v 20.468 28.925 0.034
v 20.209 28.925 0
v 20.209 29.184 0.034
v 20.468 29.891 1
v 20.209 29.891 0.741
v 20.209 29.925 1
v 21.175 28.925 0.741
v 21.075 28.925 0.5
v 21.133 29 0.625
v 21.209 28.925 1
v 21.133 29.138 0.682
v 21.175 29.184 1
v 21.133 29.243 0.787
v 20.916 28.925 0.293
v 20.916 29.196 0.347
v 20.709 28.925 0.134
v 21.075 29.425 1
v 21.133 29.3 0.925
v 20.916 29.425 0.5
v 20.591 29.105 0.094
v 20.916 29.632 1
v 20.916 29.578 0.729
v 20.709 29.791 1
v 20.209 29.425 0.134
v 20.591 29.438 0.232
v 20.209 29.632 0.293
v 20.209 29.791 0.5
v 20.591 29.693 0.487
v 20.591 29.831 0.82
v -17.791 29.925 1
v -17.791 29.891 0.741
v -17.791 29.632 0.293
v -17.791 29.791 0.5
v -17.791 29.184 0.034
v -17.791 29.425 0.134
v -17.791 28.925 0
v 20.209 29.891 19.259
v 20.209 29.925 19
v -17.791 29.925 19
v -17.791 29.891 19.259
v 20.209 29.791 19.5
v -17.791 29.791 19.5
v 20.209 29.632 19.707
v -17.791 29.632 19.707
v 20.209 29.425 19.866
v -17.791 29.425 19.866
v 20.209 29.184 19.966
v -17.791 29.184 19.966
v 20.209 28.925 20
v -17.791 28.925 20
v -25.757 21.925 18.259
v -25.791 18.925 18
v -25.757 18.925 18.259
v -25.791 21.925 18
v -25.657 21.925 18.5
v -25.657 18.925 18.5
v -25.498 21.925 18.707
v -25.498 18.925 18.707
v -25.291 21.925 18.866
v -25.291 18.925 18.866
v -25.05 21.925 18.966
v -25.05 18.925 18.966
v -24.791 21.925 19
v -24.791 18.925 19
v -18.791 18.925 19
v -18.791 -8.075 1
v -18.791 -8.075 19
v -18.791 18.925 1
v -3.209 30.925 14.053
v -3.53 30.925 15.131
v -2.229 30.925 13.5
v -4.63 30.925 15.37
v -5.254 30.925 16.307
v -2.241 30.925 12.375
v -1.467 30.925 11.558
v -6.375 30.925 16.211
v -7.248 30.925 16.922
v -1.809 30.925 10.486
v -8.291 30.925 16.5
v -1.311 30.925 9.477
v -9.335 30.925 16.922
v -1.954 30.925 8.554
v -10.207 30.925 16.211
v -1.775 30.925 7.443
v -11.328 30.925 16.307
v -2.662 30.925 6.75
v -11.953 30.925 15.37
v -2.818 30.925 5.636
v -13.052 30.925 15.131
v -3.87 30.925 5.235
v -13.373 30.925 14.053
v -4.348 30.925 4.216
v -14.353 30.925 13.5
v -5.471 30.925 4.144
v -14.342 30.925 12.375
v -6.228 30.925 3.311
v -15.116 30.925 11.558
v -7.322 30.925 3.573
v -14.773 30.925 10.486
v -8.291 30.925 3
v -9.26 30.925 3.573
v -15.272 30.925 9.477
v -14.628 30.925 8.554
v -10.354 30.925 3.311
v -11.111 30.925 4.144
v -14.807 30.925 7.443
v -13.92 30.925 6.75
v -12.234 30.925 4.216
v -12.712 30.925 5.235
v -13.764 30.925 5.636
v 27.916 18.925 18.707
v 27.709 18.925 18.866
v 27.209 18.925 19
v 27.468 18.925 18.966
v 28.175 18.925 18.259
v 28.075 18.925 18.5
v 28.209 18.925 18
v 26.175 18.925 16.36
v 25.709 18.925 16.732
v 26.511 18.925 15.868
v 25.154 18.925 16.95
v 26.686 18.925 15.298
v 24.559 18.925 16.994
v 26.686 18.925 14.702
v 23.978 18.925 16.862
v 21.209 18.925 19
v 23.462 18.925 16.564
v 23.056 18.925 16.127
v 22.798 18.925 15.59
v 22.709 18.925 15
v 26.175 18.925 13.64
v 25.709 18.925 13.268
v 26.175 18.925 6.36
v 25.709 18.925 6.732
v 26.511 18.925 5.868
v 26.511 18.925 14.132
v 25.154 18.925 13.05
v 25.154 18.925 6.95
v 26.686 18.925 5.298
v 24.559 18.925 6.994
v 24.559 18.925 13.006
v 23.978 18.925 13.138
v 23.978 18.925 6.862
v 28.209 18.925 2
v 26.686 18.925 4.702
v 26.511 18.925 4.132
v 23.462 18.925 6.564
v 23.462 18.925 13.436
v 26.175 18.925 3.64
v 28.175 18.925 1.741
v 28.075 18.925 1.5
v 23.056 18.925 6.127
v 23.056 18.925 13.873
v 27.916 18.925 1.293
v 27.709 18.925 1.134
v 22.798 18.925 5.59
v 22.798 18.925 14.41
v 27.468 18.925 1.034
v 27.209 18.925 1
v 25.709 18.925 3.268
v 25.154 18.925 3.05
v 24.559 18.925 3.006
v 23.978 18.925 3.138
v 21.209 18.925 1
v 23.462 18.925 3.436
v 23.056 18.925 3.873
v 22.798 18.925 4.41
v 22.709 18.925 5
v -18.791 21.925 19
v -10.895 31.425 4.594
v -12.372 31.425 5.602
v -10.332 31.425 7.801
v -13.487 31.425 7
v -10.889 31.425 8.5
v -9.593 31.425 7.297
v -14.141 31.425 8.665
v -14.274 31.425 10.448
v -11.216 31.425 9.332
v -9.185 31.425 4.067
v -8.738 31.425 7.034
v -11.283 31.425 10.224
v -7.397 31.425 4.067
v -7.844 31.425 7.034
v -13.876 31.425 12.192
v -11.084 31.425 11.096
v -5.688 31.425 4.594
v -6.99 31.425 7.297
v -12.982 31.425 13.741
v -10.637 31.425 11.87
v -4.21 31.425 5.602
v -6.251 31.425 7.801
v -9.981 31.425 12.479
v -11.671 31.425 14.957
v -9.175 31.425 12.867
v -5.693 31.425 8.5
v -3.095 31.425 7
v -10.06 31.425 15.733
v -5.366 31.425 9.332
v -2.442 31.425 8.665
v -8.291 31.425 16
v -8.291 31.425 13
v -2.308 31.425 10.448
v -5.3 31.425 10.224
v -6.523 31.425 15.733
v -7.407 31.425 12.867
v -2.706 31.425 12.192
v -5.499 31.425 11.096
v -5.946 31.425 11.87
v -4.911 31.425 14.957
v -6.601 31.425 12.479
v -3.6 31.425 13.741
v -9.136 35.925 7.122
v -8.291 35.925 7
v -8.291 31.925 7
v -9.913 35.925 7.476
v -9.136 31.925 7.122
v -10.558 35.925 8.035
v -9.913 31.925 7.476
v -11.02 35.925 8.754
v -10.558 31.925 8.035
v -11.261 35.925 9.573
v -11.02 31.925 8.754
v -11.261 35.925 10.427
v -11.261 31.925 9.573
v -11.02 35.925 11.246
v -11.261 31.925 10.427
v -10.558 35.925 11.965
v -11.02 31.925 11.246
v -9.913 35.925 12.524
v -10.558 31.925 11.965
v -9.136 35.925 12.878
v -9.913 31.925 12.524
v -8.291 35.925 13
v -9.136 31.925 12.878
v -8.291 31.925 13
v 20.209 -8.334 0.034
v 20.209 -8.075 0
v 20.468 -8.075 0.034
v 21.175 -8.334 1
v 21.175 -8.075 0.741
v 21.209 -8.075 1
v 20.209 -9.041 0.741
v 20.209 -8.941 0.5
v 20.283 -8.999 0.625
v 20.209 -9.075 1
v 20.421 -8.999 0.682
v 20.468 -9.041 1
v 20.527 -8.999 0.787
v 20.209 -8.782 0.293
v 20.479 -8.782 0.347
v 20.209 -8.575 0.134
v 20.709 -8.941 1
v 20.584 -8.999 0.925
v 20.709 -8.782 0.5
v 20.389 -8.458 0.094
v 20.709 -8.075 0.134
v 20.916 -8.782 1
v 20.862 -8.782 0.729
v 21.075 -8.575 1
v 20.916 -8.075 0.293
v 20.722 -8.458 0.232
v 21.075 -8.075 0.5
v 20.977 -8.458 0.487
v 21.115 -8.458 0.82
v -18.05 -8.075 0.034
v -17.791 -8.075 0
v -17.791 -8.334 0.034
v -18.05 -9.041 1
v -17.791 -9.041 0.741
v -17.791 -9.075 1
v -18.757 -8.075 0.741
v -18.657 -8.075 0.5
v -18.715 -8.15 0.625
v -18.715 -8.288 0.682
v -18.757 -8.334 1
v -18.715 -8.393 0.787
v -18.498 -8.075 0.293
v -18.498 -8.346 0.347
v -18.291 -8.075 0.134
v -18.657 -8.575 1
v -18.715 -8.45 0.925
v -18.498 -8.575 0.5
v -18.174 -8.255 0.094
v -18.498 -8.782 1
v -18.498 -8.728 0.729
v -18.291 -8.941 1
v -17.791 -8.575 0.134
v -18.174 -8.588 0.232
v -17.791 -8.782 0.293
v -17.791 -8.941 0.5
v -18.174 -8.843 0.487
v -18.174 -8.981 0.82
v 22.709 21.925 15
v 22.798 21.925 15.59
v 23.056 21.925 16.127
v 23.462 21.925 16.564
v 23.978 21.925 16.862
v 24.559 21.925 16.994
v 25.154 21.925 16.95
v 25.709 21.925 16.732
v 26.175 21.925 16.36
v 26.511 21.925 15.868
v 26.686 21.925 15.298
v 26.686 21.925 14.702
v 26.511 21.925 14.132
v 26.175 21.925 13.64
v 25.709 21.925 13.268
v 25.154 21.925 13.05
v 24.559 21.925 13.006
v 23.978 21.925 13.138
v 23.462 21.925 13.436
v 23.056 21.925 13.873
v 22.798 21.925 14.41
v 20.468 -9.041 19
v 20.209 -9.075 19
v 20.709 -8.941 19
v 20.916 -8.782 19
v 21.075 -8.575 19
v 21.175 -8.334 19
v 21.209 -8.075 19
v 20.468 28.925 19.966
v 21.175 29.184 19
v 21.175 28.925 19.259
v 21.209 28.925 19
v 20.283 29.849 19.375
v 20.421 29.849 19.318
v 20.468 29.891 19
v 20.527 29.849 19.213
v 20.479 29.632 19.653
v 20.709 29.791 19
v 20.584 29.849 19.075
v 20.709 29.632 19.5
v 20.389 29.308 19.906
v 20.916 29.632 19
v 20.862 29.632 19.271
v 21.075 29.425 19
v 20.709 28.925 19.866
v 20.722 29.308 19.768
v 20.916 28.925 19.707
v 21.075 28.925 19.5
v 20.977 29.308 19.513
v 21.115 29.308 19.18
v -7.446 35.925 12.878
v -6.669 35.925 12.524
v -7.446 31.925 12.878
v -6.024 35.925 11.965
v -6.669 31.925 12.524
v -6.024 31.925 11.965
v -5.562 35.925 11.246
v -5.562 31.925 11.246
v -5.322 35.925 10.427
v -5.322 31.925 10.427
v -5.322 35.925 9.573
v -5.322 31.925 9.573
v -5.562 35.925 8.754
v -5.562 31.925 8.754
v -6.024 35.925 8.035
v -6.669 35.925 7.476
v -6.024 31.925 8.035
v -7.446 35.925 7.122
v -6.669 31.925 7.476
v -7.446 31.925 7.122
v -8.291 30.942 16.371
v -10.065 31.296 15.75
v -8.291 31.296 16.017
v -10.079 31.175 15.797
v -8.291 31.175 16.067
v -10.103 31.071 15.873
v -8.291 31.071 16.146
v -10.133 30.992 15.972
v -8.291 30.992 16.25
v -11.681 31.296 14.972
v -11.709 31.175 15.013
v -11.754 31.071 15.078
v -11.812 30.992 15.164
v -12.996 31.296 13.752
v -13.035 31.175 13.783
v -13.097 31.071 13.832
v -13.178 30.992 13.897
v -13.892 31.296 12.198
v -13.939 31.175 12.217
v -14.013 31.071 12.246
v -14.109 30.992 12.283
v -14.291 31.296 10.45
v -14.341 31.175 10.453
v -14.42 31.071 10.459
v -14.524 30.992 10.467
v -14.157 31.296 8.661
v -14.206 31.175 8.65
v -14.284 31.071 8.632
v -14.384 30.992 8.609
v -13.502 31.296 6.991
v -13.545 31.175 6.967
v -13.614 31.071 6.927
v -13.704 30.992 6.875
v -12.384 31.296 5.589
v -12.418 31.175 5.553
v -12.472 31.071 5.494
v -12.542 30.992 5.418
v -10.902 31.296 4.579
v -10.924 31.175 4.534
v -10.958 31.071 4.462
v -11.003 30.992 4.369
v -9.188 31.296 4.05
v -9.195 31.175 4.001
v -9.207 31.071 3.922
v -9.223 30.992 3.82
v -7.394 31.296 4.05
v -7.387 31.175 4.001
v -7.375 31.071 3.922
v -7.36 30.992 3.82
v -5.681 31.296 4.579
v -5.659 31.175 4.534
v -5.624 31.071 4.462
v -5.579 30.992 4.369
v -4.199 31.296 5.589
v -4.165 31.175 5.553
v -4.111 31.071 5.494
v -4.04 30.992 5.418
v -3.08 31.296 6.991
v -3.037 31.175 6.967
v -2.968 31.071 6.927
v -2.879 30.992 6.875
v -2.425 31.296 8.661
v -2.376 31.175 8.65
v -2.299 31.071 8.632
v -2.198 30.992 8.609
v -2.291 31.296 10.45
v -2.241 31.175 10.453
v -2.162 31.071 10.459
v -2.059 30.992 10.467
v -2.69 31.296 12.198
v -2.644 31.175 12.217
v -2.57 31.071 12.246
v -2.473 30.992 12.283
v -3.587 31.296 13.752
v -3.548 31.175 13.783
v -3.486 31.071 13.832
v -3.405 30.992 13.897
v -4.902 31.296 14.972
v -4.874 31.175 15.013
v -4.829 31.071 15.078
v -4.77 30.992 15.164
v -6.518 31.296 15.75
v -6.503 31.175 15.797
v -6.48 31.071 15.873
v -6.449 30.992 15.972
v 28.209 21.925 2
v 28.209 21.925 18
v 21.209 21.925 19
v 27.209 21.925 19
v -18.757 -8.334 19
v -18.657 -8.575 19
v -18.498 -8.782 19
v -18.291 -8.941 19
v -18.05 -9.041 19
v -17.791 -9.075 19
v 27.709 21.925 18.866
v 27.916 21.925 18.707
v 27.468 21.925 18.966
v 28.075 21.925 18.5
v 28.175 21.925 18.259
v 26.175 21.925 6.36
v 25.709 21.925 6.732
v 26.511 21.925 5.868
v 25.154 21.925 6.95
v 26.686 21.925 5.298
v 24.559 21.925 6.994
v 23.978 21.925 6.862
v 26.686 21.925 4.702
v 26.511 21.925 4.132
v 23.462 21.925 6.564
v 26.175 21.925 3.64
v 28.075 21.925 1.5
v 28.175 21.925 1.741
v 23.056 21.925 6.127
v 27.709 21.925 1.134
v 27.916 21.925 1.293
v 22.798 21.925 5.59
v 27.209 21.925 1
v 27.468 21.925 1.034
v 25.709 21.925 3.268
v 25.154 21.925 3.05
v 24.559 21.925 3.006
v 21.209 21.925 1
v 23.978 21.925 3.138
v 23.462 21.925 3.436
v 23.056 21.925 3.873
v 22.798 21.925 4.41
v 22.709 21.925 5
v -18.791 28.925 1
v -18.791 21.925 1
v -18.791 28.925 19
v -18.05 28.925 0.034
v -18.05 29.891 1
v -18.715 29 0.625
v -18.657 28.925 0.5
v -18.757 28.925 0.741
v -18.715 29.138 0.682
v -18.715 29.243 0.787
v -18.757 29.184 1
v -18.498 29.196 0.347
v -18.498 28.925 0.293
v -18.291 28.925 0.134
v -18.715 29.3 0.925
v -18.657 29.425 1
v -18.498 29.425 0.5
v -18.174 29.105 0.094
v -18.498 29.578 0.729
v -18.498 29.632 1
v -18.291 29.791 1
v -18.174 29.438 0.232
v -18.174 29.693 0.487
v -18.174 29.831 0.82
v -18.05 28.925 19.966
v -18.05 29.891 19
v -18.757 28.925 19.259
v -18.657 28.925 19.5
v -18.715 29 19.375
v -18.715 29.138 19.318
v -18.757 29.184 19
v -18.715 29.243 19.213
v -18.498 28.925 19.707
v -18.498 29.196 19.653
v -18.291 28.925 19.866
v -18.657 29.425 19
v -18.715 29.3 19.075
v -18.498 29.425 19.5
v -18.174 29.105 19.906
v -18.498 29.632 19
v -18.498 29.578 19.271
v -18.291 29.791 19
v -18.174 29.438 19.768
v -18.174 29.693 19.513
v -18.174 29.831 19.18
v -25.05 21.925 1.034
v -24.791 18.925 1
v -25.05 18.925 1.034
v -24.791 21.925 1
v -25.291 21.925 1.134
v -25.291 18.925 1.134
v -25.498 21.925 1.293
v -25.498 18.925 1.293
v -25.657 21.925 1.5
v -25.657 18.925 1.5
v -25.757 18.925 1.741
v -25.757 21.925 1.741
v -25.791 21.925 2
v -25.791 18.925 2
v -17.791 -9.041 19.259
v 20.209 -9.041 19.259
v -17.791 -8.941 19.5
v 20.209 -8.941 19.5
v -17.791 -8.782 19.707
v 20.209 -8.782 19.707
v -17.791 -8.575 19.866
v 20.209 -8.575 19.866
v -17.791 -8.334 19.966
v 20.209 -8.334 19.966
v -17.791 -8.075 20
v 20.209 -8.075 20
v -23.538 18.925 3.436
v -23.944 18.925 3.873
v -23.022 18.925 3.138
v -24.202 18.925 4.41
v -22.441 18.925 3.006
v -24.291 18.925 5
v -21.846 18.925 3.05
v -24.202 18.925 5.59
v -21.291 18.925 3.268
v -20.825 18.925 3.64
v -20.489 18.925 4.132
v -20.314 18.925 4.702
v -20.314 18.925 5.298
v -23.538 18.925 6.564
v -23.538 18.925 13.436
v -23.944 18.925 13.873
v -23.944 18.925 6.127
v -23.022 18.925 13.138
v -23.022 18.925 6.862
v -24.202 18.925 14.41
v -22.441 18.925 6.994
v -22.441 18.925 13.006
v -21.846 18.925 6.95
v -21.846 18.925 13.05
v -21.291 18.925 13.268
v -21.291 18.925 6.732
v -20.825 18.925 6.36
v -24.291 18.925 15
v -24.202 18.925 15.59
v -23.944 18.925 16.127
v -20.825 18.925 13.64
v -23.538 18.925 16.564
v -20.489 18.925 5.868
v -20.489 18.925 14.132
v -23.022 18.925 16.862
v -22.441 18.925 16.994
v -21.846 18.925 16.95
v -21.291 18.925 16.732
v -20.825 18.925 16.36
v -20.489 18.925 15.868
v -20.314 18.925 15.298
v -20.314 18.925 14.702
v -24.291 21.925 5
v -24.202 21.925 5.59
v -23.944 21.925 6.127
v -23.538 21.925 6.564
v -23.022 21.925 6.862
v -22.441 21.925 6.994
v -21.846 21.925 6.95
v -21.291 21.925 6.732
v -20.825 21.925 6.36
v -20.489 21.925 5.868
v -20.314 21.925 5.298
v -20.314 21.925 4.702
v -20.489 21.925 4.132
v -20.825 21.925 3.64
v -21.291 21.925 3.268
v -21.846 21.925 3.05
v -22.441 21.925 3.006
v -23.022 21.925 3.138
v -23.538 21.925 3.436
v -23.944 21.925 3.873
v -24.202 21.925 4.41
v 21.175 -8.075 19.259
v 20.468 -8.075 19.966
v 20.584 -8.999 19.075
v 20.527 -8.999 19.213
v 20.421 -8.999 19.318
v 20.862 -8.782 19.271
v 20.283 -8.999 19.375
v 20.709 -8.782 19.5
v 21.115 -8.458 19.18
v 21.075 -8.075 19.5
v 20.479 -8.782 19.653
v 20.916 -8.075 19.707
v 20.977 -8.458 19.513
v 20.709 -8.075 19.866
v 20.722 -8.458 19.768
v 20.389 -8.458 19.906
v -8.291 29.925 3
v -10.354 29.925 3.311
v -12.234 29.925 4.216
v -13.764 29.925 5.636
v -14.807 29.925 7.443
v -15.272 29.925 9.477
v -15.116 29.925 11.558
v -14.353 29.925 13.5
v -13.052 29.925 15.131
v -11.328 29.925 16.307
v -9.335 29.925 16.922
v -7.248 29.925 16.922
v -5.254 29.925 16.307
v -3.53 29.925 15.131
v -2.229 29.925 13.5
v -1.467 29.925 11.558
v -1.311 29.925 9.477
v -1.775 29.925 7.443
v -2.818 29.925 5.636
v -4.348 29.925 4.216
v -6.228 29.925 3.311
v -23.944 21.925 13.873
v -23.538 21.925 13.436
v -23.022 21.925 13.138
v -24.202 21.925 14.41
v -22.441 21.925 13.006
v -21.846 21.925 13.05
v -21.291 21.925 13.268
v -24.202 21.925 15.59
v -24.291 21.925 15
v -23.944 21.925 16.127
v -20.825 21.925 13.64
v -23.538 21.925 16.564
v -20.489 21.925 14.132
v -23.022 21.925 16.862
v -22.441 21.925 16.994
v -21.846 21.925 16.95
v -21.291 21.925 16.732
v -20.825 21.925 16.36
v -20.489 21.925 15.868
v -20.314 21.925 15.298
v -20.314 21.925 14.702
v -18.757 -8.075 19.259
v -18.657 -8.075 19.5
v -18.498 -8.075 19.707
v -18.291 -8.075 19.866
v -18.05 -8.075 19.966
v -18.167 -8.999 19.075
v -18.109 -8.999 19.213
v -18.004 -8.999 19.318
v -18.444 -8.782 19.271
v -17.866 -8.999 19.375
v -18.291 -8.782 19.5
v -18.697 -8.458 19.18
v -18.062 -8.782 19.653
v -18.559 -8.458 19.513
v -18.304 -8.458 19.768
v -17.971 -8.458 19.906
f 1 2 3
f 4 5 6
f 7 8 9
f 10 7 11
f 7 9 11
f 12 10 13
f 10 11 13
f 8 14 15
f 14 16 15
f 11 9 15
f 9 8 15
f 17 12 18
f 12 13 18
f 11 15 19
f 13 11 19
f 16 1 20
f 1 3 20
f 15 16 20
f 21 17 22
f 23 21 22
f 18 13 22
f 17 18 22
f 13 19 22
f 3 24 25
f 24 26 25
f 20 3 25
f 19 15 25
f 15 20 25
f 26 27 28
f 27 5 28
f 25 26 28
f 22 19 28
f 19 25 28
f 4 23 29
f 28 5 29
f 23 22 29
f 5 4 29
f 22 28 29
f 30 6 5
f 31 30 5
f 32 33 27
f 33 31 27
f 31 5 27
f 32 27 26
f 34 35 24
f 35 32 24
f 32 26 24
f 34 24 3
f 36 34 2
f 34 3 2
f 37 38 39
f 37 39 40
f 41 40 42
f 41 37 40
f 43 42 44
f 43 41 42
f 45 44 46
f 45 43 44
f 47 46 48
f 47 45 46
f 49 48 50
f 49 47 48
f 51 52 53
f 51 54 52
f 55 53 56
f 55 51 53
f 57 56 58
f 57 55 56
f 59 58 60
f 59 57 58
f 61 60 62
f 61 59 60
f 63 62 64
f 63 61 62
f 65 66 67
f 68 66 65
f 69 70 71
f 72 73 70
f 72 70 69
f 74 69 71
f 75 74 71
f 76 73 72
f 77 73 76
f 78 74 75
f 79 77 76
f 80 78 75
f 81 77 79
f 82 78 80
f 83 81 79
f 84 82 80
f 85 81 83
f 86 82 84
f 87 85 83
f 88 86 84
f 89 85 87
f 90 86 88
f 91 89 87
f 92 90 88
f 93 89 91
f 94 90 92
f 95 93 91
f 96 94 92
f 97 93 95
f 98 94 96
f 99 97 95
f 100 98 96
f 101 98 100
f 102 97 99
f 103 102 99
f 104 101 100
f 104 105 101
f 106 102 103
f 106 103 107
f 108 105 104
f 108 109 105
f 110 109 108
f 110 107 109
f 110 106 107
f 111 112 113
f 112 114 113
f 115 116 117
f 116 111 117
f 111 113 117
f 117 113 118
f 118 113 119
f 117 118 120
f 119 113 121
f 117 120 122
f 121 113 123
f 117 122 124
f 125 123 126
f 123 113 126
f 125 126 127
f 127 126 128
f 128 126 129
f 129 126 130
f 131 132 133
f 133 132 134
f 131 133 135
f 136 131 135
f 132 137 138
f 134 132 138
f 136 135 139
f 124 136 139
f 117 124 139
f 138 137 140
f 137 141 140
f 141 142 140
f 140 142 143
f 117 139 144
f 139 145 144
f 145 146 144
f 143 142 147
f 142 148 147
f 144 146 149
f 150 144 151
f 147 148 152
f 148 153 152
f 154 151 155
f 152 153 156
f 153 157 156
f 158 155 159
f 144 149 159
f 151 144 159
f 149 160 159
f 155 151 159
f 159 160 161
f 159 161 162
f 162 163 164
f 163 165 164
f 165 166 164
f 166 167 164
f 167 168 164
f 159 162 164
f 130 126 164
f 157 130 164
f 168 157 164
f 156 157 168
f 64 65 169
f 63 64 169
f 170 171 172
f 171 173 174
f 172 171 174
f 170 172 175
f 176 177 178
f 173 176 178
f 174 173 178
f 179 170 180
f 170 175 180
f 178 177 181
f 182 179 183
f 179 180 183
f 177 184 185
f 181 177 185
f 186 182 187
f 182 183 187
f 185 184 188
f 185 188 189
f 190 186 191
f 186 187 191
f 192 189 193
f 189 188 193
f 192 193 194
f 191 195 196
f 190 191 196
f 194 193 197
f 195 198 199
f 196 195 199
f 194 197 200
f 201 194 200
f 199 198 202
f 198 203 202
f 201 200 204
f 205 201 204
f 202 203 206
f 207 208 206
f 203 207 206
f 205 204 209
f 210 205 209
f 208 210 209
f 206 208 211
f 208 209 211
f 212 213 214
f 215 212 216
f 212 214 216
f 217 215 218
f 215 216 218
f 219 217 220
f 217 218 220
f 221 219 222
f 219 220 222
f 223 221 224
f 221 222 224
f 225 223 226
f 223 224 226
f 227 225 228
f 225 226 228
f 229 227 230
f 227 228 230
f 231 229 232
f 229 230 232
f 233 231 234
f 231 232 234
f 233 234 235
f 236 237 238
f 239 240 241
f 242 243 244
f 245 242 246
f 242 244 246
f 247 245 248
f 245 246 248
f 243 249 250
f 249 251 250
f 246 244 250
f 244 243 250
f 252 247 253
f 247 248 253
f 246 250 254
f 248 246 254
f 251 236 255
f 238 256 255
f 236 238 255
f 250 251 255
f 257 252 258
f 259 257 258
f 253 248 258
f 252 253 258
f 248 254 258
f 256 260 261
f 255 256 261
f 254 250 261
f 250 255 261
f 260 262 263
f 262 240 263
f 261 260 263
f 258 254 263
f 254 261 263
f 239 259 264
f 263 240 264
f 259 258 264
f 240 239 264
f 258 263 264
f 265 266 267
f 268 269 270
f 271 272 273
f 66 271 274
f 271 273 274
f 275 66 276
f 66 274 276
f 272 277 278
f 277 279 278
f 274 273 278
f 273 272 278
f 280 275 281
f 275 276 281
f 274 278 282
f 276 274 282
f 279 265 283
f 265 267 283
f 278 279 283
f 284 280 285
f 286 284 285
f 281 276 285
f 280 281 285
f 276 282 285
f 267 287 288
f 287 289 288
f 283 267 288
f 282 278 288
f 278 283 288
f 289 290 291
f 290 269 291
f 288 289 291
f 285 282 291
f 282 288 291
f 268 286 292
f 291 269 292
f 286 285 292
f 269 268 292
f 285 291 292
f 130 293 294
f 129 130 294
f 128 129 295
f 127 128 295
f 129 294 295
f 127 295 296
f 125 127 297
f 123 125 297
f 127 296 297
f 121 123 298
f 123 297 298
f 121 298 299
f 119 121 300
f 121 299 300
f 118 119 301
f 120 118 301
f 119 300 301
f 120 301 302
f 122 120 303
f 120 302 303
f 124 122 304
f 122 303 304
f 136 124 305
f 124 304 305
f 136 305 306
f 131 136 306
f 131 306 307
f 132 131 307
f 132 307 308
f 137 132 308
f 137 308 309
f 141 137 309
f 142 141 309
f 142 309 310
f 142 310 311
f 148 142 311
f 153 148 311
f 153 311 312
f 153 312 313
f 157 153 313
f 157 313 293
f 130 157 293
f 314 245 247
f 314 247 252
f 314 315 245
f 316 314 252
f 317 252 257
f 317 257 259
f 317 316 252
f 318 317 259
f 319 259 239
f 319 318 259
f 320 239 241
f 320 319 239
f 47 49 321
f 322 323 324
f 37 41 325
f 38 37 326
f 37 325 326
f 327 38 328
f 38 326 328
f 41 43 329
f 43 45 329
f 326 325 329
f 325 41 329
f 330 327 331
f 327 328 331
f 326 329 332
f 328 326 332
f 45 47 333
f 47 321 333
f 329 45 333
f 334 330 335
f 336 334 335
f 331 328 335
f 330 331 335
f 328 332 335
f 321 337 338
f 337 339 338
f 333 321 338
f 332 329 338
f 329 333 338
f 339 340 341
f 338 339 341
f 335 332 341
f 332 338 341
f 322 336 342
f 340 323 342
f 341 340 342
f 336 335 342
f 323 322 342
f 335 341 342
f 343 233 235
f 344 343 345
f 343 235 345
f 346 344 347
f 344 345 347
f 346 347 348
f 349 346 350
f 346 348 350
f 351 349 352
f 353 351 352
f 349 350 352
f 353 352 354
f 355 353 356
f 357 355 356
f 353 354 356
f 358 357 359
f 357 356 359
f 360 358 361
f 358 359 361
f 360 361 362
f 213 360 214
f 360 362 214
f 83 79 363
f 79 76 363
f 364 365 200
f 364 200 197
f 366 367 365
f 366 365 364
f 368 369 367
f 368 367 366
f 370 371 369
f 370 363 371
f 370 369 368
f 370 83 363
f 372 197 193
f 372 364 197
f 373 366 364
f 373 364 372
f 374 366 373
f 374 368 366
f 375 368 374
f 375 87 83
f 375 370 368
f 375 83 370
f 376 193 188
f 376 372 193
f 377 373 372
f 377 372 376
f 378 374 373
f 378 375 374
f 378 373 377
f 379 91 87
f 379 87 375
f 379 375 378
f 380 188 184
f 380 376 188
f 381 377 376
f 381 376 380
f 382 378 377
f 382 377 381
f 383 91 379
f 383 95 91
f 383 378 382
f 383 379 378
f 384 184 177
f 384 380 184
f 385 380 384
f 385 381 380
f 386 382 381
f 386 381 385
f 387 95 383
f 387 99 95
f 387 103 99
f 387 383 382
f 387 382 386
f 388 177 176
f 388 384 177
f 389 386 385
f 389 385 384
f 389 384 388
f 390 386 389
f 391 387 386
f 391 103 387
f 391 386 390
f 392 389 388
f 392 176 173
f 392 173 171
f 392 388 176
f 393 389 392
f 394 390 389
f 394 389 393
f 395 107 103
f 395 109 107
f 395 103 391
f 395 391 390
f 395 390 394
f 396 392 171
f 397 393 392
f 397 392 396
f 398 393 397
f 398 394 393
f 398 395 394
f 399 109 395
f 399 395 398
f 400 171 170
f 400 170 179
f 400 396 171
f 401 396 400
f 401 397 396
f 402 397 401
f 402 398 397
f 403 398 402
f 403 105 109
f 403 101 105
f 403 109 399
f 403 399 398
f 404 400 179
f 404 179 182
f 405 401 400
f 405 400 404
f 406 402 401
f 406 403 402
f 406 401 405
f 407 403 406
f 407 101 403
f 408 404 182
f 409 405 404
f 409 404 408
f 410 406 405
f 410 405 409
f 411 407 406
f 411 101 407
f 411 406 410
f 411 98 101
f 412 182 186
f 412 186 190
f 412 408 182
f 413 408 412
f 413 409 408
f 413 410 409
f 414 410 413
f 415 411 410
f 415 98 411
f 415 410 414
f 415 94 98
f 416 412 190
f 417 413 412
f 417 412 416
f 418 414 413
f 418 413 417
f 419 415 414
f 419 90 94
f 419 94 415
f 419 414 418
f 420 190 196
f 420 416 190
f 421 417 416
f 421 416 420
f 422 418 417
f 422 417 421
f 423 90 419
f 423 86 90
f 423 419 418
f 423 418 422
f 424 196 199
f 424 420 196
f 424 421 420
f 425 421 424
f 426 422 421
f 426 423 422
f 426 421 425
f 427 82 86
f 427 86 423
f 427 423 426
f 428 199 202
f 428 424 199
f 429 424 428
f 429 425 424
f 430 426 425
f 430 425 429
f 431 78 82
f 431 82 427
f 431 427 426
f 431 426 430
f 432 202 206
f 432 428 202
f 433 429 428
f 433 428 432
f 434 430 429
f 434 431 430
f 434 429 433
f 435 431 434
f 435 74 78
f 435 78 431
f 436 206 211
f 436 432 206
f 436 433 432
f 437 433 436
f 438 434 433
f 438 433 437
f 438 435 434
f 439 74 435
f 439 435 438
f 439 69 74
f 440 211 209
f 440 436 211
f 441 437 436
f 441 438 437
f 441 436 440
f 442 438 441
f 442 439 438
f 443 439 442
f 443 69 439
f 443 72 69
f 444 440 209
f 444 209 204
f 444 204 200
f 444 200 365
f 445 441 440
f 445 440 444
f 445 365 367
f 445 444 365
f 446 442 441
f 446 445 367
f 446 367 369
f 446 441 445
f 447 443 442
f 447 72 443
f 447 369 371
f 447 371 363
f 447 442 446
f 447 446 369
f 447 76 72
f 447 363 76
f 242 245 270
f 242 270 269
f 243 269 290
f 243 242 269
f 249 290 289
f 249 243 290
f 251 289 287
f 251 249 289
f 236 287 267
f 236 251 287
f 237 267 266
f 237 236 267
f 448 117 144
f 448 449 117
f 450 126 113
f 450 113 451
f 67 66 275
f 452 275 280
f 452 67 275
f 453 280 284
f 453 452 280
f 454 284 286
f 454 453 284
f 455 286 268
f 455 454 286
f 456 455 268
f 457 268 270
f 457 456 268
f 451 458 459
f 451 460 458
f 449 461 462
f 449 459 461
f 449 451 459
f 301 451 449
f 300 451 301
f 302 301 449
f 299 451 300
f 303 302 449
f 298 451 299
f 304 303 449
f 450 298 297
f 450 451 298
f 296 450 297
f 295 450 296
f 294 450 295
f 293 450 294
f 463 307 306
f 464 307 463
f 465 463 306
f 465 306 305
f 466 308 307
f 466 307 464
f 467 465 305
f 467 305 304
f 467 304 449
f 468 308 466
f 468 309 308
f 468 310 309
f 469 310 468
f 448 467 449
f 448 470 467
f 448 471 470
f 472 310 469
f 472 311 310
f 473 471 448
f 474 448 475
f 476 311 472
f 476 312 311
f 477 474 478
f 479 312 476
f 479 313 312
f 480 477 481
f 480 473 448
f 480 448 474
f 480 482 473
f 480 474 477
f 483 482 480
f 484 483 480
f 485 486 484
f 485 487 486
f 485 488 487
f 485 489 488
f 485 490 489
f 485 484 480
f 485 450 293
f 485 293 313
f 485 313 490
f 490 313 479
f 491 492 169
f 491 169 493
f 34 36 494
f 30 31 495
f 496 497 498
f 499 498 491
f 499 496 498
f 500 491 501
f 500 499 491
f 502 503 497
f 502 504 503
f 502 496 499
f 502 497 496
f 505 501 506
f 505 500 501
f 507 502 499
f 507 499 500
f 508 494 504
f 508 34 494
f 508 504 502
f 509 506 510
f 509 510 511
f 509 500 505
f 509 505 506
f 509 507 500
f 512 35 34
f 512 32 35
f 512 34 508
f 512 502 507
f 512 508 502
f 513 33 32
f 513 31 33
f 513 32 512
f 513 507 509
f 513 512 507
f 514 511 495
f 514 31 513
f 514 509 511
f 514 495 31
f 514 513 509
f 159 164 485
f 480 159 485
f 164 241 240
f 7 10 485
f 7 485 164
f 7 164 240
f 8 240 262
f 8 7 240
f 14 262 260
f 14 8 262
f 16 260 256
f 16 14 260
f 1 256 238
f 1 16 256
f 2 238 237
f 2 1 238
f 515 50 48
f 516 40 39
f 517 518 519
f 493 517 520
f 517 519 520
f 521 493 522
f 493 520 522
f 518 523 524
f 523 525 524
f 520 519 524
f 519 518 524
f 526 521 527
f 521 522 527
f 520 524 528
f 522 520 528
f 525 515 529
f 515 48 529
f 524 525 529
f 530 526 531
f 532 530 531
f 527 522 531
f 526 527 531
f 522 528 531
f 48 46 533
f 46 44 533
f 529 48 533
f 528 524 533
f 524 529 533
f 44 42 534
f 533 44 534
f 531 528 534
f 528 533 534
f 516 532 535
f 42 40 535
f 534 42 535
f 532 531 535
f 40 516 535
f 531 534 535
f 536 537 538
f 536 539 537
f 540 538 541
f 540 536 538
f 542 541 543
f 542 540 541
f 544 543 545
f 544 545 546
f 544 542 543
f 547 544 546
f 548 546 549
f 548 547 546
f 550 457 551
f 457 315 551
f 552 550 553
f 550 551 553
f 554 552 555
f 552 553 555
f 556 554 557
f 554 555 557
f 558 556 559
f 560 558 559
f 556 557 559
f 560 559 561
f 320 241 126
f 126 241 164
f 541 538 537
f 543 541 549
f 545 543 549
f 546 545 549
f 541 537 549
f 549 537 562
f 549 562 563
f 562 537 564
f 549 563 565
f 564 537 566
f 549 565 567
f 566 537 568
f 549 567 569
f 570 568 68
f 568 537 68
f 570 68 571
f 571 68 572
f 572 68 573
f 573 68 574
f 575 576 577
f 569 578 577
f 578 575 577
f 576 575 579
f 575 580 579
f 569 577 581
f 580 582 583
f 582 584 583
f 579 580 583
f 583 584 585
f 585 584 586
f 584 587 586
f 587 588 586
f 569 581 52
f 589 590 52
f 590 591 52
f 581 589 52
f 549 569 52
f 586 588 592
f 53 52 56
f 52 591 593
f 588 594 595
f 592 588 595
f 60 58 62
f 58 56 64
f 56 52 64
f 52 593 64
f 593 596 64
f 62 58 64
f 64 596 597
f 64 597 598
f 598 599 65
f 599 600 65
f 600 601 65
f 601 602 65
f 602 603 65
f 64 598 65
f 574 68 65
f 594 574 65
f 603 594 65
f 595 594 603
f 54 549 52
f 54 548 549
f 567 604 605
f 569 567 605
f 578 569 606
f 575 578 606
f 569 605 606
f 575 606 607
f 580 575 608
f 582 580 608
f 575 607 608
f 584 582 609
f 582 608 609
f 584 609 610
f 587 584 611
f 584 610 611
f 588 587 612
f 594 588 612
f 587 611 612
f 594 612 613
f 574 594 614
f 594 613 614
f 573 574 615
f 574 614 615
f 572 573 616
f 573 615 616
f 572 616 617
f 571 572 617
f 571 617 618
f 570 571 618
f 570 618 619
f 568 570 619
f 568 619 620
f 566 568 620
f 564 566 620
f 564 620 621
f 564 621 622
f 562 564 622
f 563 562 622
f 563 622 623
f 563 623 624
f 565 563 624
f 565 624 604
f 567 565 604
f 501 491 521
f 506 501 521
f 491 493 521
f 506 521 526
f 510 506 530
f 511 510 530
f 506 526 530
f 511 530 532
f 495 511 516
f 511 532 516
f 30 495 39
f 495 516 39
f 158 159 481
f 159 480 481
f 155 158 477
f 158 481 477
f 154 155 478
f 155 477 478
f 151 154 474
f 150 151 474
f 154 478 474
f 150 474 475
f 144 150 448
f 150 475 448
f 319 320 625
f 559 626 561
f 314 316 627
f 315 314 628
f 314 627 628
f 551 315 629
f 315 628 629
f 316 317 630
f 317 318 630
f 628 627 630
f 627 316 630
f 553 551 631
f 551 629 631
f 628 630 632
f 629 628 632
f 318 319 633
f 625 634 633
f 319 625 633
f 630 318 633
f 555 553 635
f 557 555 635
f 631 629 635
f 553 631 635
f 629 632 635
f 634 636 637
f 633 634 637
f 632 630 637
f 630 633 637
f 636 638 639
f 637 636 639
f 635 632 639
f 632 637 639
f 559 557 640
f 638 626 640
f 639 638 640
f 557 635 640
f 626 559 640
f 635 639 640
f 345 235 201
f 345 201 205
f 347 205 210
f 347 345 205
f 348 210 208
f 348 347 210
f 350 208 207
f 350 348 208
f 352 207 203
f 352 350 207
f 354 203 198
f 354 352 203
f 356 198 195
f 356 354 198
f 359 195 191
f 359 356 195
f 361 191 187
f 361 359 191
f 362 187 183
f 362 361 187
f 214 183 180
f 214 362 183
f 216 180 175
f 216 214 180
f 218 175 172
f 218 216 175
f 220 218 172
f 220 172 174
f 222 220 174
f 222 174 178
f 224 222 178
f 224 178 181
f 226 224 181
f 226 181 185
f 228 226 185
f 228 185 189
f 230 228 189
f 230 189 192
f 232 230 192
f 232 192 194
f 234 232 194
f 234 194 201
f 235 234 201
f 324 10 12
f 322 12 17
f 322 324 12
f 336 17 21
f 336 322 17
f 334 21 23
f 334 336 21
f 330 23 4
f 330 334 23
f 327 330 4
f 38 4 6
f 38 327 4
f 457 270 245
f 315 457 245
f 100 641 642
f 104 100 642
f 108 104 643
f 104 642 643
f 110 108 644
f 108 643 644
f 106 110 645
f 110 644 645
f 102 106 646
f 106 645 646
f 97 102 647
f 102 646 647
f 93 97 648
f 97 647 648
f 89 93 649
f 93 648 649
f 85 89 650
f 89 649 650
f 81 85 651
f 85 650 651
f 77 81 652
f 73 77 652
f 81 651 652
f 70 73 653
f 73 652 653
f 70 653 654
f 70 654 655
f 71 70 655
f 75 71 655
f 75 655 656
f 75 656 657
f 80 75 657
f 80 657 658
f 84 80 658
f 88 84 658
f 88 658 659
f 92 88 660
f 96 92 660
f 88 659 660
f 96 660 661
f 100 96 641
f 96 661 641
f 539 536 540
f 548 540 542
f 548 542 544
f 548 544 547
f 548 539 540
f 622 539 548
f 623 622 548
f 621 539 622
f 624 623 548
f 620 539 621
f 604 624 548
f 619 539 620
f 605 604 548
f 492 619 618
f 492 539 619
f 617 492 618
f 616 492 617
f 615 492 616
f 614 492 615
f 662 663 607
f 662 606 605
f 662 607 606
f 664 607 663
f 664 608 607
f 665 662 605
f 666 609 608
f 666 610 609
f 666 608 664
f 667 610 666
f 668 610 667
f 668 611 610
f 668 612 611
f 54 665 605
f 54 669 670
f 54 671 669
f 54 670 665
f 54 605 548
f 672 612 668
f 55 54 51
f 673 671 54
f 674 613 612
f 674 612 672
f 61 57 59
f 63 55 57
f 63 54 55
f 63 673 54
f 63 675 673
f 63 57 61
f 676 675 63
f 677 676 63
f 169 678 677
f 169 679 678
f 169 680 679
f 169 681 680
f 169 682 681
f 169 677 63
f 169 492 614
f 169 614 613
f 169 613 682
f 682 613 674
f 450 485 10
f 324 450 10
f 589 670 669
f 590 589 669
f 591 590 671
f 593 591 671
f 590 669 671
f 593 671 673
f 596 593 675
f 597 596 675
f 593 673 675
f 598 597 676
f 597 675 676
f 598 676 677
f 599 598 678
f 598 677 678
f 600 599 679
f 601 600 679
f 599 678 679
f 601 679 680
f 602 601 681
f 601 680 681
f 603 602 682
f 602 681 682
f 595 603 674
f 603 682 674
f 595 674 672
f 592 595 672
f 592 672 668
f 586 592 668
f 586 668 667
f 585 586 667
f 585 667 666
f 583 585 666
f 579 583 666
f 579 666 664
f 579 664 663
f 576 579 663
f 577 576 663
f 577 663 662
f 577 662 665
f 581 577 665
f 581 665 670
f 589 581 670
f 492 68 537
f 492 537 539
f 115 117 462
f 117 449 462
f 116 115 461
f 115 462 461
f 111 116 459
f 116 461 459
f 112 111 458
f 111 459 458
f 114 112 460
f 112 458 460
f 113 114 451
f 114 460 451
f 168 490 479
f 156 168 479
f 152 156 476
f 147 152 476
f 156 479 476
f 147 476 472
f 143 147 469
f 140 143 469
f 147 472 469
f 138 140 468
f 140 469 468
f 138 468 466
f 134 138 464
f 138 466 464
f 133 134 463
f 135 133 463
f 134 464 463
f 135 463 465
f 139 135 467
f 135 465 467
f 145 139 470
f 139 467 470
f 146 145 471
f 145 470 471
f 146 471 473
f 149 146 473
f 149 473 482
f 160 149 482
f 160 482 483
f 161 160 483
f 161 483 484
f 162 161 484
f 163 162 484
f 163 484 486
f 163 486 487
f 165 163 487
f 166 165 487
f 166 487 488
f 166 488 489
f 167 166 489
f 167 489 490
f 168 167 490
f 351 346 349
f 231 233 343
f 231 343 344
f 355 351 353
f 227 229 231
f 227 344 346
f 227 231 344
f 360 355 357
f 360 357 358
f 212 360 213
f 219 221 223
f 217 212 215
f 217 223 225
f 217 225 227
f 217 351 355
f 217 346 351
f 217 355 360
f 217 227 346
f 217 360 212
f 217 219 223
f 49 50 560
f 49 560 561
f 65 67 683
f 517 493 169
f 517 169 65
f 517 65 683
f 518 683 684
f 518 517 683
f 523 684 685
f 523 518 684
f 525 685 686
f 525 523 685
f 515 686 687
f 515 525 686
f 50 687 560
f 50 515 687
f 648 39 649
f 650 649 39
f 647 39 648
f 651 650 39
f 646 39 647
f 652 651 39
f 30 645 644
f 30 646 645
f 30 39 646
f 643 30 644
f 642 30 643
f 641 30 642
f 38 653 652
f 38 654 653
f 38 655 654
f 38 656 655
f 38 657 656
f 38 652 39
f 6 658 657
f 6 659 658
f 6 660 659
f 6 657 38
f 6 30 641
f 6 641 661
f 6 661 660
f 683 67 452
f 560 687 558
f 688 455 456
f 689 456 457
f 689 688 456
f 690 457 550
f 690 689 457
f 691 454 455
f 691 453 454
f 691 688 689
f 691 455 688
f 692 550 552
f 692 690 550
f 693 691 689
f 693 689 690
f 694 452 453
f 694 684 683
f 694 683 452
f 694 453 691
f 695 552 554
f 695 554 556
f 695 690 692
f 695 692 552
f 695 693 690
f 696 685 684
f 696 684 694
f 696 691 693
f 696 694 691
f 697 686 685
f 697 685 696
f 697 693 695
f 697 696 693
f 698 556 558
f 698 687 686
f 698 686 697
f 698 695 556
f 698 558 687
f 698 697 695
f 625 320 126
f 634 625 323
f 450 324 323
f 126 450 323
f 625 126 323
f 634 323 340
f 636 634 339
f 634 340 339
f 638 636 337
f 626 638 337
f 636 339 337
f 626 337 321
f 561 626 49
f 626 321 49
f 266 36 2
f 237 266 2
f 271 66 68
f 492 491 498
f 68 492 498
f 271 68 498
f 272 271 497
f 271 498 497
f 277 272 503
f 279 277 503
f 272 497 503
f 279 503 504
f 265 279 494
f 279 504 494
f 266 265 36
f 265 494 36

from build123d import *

# Parameters (mm, degrees)
SKETCH_1_W          = 40
SKETCH_1_H          = 39
EXTRUDE_1_DEPTH     = 20
FILLET_1_R          = 1
SKETCH_2_W          = 18
SKETCH_2_H          = 3
EXTRUDE_2_DEPTH     = 7
SKETCH_3_W          = 18
SKETCH_3_H          = 3
EXTRUDE_3_DEPTH     = 7
FILLET_8_R          = 1
FILLET_9_R          = 1
SKETCH_4_R          = 2
CUT_EXTRUDE_1_DEPTH = 7
SKETCH_5_R          = 2
CUT_EXTRUDE_2_DEPTH = 7
SKETCH_6_R          = 2
CUT_EXTRUDE_3_DEPTH = 7
SKETCH_8_R          = 2
CUT_EXTRUDE_4_DEPTH = 7
SKETCH_9_R          = 3
EXTRUDE_4_DEPTH     = 6
SKETCH_10_R         = 7
EXTRUDE_5_DEPTH     = 1
SKETCH_11_R         = 6
EXTRUDE_6_DEPTH     = 2
FILLET_11_R         = 0.5
SKETCH_12_W         = 12
SKETCH_12_H         = 0.5
CUT_EXTRUDE_6_DEPTH = 19
SKETCH_13_R         = 3
EXTRUDE_7_DEPTH     = 6


with BuildPart() as part:
    # 草图1 → 凸台-拉伸1 (new body)
    with BuildSketch(Plane.XY):
        with Locations((1.208791209, 10.42505216)):
            Rectangle(SKETCH_1_W, SKETCH_1_H)
    extrude(amount=EXTRUDE_1_DEPTH)

    # 圆角1
    fillet_1_edges = [part.edges().sort_by_distance(p)[0] for p in [
        (21.208791209, 10.42505216, 20),
        (1.208791209, 29.92505216, 20),
        (-18.791208791, 10.42505216, 20),
        (1.208791209, 29.92505216, 0),
        (21.208791209, 10.42505216, 0),
        (1.208791209, -9.07494784, 0),
        (-18.791208791, 10.42505216, 0),
        (-18.791208791, 29.92505216, 10),
        (21.208791209, 29.92505216, 10),
        (21.208791209, -9.07494784, 10),
        (-18.791208791, -9.07494784, 10),
        (1.208791209, -9.07494784, 20),
    ]]
    fillet(fillet_1_edges, radius=FILLET_1_R)

    # 草图2 → 凸台-拉伸2 (add)
    with BuildSketch(Plane.ZY.offset(18.791208791)):
        with Locations((10, 20.42505216)):
            Rectangle(SKETCH_2_W, SKETCH_2_H)
    extrude(amount=EXTRUDE_2_DEPTH)

    # 草图3 → 凸台-拉伸3 (add)
    with BuildSketch(Plane(origin=(21.208791209, 0, 0), x_dir=(0, 0, -1), z_dir=(1, 0, 0))):
        with Locations((-10, 20.42505216)):
            Rectangle(SKETCH_3_W, SKETCH_3_H)
    extrude(amount=EXTRUDE_3_DEPTH)

    # 圆角8
    fillet_8_edges = [part.edges().sort_by_distance(p)[0] for p in [
        (28.208791209, 20.42505216, 1),
    ]]
    fillet(fillet_8_edges, radius=FILLET_8_R)

    # 圆角9
    fillet_9_edges = [part.edges().sort_by_distance(p)[0] for p in [
        (-25.791208791, 20.42505216, 19),
        (-25.791208791, 20.42505216, 1),
        (28.208791209, 20.42505216, 19),
    ]]
    fillet(fillet_9_edges, radius=FILLET_9_R)

    # 草图4 → 切除-拉伸1 (cut)
    with BuildSketch(Plane(origin=(0, 21.92505216, 0), x_dir=(1, 0, 0), z_dir=(0, 1, 0))):
        with Locations(Location((-22.291208791, -5, 0), (0, 0, 180))):
            Circle(SKETCH_4_R)
    extrude(amount=-CUT_EXTRUDE_1_DEPTH, mode=Mode.SUBTRACT)

    # 草图5 → 切除-拉伸2 (cut)
    with BuildSketch(Plane(origin=(0, 21.92505216, 0), x_dir=(1, 0, 0), z_dir=(0, 1, 0))):
        with Locations(Location((-22.291208791, -15, 0), (0, 0, 180))):
            Circle(SKETCH_5_R)
    extrude(amount=-CUT_EXTRUDE_2_DEPTH, mode=Mode.SUBTRACT)

    # 草图6 → 切除-拉伸3 (cut)
    with BuildSketch(Plane(origin=(0, 21.92505216, 0), x_dir=(1, 0, 0), z_dir=(0, 1, 0))):
        with Locations(Location((24.708791209, -5, 0), (0, 0, 180))):
            Circle(SKETCH_6_R)
    extrude(amount=-CUT_EXTRUDE_3_DEPTH, mode=Mode.SUBTRACT)

    # 草图8 → 切除-拉伸4 (cut)
    with BuildSketch(Plane(origin=(0, 21.92505216, 0), x_dir=(1, 0, 0), z_dir=(0, 1, 0))):
        with Locations(Location((24.708791209, -15, 0), (0, 0, 180))):
            Circle(SKETCH_8_R)
    extrude(amount=-CUT_EXTRUDE_4_DEPTH, mode=Mode.SUBTRACT)

    # 草图9 → 凸台-拉伸4 (add)
    with BuildSketch(Plane(origin=(0, 29.92505216, 0), x_dir=(1, 0, 0), z_dir=(0, 1, 0))):
        with Locations(Location((-8.291208791, -10, 0), (0, 0, 90))):
            Circle(SKETCH_9_R)
    extrude(amount=EXTRUDE_4_DEPTH)

    # 草图10 → 凸台-拉伸5 (add)
    with BuildSketch(Plane(origin=(0, 29.92505216, 0), x_dir=(1, 0, 0), z_dir=(0, 1, 0))):
        with Locations(Location((-8.291208791, -10, 0), (0, 0, 90))):
            Circle(SKETCH_10_R)
    extrude(amount=EXTRUDE_5_DEPTH)

    # 草图11 → 凸台-拉伸6 (add)
    with BuildSketch(Plane(origin=(0, 29.92505216, 0), x_dir=(1, 0, 0), z_dir=(0, 1, 0))):
        with Locations(Location((-8.291208791, -10, 0), (0, 0, 270))):
            Circle(SKETCH_11_R)
    extrude(amount=EXTRUDE_6_DEPTH)

    # 圆角11
    fillet_11_edges = [part.edges().sort_by_distance(p)[0] for p in [
        (-8.291208791, 30.92505216, 4),
        (-8.291208791, 31.92505216, 4),
    ]]
    fillet(fillet_11_edges, radius=FILLET_11_R - 0.0001)  # a hair under: the kernel refuses the full size

    # 草图12 → 切除-拉伸6 (cut)
    with BuildSketch(Plane.XY.offset(20)):
        with Locations((-8.291208791, 31.67505216)):
            Rectangle(SKETCH_12_W, SKETCH_12_H)
    extrude(amount=-CUT_EXTRUDE_6_DEPTH, mode=Mode.SUBTRACT)


with BuildPart() as cut_extrude_6_piece_1:
    # of the separate pieces the step leaves, piece 1, a body of its own (cut_extrude_6_pieces)
    add(part.part.solids().sort_by_distance((-8.291208791, 30.92505216, 16.4999))[0])



with BuildPart() as cut_extrude_6_piece_2:
    # of the separate pieces the step leaves, piece 2, a body of its own (cut_extrude_6_pieces)
    add(part.part.solids().sort_by_distance((-8.291208791, 31.92505216, 7))[0])


with BuildPart() as cut_extrude_6_piece_1_1:
    add(cut_extrude_6_piece_1.part)

    add(cut_extrude_6_piece_2.part)  # 凸台-拉伸7 merges 切除-拉伸6 piece 2
    # 草图13 → 凸台-拉伸7 (add)
    with BuildSketch(Plane(origin=(0, 35.92505216, 0), x_dir=(1, 0, 0), z_dir=(0, 1, 0))):
        with Locations(Location((-8.291208791, -10, 0), (0, 0, 270))):
            Circle(SKETCH_13_R)
    extrude(amount=-EXTRUDE_7_DEPTH)


solid = cut_extrude_6_piece_1_1.part
